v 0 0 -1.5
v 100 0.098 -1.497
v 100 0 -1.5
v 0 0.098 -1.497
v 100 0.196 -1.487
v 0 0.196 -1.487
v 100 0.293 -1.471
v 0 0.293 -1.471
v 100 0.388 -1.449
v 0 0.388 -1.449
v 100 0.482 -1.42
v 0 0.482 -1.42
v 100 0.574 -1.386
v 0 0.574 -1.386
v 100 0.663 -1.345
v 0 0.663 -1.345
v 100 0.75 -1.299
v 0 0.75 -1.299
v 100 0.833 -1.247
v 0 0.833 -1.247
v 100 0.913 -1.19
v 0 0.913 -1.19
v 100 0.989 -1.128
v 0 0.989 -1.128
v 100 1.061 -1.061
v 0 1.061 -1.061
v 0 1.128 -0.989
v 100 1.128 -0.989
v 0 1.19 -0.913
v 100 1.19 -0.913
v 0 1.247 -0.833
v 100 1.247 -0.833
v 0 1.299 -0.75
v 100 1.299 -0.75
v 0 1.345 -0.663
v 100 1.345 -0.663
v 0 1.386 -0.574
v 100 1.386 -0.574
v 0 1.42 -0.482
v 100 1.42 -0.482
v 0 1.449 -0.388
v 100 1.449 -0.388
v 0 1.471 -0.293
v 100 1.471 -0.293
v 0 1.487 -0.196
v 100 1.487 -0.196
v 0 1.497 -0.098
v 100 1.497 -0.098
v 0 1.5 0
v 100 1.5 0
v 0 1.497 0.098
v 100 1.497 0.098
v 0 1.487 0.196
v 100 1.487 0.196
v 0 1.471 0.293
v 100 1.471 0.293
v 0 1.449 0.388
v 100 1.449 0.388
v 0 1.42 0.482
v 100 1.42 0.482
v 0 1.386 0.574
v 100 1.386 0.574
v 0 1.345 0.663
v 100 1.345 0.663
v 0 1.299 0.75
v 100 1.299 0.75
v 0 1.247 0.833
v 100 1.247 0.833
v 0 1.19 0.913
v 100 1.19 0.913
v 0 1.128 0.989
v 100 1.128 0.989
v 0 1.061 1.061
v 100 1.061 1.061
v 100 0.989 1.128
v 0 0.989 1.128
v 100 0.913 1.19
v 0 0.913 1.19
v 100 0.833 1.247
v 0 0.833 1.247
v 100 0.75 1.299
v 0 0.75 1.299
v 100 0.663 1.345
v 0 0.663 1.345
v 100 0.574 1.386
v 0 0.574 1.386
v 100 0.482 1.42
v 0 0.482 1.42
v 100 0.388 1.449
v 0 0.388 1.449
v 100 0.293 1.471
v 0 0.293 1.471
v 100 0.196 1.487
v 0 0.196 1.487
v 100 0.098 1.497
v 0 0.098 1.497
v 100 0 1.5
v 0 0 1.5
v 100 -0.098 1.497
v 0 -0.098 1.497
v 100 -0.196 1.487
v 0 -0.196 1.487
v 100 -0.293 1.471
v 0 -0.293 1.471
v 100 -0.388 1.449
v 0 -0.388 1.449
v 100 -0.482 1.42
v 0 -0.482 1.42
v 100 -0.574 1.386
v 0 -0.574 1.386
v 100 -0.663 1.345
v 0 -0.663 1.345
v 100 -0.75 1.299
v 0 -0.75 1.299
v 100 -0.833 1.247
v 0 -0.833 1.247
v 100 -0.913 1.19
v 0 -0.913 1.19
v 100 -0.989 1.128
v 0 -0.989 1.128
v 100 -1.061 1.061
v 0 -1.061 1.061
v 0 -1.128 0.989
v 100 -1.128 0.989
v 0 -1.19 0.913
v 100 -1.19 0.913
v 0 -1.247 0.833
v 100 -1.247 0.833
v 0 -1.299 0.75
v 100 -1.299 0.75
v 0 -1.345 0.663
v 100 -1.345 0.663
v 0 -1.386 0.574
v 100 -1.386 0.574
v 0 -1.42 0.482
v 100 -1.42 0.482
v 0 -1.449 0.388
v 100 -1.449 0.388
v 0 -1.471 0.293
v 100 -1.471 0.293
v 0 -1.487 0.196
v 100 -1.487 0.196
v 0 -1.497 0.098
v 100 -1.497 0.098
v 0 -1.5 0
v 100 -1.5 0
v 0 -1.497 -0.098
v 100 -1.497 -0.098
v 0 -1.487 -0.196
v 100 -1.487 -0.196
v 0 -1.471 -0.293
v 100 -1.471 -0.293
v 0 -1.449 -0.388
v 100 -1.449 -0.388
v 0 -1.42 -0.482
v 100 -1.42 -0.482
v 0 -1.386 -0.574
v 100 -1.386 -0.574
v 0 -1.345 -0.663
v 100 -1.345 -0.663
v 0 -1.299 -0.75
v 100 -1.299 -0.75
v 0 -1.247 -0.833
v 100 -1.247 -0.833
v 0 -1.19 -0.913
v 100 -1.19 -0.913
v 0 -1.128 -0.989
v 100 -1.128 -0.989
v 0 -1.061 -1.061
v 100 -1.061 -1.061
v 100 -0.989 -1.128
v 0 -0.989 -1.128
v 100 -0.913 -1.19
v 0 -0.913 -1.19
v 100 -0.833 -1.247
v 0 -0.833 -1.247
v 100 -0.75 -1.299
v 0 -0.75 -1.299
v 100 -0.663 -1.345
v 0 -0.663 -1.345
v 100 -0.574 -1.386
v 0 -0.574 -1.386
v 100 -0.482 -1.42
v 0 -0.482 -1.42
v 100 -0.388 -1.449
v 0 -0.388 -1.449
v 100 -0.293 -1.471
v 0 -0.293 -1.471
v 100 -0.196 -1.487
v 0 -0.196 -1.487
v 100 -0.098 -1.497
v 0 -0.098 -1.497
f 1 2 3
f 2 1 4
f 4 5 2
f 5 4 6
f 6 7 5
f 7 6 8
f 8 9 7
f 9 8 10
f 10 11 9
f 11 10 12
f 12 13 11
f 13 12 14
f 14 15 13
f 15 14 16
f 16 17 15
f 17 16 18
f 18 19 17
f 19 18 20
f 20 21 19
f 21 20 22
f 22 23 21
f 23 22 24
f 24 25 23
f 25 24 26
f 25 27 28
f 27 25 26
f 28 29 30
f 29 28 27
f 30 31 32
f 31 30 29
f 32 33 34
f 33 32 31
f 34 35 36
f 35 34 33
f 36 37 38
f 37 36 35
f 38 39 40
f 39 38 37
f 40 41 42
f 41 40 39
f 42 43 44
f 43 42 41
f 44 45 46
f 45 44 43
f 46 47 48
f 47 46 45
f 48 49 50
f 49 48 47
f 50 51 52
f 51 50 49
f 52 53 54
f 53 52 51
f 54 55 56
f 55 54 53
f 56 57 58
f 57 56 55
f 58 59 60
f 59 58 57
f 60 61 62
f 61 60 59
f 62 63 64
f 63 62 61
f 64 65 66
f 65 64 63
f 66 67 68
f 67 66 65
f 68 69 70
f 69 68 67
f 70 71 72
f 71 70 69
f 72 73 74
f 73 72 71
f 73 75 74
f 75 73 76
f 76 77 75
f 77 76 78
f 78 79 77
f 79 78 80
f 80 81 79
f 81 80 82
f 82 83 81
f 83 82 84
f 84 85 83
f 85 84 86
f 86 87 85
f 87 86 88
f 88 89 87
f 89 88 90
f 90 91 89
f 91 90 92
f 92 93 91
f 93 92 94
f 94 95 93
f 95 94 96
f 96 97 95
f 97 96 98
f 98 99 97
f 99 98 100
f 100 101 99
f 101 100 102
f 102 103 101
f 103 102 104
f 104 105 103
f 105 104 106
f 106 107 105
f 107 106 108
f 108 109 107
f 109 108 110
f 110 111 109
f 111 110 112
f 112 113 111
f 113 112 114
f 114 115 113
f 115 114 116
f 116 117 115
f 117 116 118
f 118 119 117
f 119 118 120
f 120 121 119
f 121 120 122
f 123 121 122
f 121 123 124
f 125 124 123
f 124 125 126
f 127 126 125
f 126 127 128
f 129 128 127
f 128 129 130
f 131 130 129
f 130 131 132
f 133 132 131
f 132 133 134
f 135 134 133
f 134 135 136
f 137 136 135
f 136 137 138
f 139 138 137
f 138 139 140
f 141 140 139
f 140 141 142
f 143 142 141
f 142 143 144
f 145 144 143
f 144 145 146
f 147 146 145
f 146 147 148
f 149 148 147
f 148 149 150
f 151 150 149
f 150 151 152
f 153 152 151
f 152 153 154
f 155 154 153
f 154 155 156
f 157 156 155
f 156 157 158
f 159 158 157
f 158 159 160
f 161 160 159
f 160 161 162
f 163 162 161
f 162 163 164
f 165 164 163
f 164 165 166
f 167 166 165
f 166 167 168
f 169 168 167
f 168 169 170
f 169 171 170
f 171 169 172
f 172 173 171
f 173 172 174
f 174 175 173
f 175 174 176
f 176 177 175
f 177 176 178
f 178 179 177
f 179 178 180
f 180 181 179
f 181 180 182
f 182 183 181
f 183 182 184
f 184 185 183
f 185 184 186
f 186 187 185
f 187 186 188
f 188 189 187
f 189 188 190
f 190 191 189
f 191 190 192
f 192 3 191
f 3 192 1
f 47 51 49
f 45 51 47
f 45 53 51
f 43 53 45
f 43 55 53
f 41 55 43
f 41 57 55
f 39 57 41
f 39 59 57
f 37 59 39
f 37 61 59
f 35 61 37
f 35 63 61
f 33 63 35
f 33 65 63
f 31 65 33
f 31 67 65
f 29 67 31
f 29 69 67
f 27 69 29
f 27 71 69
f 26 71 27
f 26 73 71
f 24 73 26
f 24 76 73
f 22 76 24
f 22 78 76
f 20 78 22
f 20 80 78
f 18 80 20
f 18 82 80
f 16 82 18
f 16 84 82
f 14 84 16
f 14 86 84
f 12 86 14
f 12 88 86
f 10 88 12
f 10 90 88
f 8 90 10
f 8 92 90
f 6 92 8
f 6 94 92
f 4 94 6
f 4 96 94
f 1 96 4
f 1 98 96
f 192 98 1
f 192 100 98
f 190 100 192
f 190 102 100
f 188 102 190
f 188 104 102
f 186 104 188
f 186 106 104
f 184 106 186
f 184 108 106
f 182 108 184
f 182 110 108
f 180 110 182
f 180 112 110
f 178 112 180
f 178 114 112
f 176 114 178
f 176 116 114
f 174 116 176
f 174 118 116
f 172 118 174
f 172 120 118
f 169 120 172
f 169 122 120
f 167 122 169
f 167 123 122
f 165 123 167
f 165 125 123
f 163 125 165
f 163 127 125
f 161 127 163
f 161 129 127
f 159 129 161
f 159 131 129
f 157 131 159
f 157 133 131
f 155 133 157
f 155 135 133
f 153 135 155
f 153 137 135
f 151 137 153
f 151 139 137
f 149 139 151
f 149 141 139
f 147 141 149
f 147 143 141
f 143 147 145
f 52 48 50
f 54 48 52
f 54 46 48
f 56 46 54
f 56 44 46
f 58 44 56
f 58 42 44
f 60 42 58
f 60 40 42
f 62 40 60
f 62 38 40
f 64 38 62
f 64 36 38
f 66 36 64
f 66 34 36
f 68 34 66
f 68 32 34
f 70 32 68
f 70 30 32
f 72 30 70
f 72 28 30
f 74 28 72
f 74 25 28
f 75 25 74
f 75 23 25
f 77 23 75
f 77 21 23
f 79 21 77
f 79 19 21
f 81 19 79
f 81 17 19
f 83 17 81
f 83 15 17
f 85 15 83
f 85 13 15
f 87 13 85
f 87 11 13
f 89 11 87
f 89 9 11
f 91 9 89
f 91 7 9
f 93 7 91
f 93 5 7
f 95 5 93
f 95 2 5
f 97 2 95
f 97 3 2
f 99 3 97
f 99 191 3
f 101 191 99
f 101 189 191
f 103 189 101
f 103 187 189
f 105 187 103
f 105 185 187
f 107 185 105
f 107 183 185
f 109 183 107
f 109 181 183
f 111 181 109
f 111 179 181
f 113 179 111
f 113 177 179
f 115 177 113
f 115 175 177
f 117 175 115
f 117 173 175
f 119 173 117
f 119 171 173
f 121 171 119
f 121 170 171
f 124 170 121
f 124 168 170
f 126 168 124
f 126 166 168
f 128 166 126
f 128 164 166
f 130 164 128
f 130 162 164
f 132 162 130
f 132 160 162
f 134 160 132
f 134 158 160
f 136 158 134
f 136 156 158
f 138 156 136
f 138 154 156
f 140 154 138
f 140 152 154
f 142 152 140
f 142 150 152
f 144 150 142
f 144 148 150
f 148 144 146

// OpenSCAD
// Inert external solid mock-up; dimensions in millimeters
// Assumed dimensions, not video-verified. No internal or propulsion features.
$fn = 96;
rotate([0,90,0]) cylinder(h=100.0, r=1.5, center=false);
